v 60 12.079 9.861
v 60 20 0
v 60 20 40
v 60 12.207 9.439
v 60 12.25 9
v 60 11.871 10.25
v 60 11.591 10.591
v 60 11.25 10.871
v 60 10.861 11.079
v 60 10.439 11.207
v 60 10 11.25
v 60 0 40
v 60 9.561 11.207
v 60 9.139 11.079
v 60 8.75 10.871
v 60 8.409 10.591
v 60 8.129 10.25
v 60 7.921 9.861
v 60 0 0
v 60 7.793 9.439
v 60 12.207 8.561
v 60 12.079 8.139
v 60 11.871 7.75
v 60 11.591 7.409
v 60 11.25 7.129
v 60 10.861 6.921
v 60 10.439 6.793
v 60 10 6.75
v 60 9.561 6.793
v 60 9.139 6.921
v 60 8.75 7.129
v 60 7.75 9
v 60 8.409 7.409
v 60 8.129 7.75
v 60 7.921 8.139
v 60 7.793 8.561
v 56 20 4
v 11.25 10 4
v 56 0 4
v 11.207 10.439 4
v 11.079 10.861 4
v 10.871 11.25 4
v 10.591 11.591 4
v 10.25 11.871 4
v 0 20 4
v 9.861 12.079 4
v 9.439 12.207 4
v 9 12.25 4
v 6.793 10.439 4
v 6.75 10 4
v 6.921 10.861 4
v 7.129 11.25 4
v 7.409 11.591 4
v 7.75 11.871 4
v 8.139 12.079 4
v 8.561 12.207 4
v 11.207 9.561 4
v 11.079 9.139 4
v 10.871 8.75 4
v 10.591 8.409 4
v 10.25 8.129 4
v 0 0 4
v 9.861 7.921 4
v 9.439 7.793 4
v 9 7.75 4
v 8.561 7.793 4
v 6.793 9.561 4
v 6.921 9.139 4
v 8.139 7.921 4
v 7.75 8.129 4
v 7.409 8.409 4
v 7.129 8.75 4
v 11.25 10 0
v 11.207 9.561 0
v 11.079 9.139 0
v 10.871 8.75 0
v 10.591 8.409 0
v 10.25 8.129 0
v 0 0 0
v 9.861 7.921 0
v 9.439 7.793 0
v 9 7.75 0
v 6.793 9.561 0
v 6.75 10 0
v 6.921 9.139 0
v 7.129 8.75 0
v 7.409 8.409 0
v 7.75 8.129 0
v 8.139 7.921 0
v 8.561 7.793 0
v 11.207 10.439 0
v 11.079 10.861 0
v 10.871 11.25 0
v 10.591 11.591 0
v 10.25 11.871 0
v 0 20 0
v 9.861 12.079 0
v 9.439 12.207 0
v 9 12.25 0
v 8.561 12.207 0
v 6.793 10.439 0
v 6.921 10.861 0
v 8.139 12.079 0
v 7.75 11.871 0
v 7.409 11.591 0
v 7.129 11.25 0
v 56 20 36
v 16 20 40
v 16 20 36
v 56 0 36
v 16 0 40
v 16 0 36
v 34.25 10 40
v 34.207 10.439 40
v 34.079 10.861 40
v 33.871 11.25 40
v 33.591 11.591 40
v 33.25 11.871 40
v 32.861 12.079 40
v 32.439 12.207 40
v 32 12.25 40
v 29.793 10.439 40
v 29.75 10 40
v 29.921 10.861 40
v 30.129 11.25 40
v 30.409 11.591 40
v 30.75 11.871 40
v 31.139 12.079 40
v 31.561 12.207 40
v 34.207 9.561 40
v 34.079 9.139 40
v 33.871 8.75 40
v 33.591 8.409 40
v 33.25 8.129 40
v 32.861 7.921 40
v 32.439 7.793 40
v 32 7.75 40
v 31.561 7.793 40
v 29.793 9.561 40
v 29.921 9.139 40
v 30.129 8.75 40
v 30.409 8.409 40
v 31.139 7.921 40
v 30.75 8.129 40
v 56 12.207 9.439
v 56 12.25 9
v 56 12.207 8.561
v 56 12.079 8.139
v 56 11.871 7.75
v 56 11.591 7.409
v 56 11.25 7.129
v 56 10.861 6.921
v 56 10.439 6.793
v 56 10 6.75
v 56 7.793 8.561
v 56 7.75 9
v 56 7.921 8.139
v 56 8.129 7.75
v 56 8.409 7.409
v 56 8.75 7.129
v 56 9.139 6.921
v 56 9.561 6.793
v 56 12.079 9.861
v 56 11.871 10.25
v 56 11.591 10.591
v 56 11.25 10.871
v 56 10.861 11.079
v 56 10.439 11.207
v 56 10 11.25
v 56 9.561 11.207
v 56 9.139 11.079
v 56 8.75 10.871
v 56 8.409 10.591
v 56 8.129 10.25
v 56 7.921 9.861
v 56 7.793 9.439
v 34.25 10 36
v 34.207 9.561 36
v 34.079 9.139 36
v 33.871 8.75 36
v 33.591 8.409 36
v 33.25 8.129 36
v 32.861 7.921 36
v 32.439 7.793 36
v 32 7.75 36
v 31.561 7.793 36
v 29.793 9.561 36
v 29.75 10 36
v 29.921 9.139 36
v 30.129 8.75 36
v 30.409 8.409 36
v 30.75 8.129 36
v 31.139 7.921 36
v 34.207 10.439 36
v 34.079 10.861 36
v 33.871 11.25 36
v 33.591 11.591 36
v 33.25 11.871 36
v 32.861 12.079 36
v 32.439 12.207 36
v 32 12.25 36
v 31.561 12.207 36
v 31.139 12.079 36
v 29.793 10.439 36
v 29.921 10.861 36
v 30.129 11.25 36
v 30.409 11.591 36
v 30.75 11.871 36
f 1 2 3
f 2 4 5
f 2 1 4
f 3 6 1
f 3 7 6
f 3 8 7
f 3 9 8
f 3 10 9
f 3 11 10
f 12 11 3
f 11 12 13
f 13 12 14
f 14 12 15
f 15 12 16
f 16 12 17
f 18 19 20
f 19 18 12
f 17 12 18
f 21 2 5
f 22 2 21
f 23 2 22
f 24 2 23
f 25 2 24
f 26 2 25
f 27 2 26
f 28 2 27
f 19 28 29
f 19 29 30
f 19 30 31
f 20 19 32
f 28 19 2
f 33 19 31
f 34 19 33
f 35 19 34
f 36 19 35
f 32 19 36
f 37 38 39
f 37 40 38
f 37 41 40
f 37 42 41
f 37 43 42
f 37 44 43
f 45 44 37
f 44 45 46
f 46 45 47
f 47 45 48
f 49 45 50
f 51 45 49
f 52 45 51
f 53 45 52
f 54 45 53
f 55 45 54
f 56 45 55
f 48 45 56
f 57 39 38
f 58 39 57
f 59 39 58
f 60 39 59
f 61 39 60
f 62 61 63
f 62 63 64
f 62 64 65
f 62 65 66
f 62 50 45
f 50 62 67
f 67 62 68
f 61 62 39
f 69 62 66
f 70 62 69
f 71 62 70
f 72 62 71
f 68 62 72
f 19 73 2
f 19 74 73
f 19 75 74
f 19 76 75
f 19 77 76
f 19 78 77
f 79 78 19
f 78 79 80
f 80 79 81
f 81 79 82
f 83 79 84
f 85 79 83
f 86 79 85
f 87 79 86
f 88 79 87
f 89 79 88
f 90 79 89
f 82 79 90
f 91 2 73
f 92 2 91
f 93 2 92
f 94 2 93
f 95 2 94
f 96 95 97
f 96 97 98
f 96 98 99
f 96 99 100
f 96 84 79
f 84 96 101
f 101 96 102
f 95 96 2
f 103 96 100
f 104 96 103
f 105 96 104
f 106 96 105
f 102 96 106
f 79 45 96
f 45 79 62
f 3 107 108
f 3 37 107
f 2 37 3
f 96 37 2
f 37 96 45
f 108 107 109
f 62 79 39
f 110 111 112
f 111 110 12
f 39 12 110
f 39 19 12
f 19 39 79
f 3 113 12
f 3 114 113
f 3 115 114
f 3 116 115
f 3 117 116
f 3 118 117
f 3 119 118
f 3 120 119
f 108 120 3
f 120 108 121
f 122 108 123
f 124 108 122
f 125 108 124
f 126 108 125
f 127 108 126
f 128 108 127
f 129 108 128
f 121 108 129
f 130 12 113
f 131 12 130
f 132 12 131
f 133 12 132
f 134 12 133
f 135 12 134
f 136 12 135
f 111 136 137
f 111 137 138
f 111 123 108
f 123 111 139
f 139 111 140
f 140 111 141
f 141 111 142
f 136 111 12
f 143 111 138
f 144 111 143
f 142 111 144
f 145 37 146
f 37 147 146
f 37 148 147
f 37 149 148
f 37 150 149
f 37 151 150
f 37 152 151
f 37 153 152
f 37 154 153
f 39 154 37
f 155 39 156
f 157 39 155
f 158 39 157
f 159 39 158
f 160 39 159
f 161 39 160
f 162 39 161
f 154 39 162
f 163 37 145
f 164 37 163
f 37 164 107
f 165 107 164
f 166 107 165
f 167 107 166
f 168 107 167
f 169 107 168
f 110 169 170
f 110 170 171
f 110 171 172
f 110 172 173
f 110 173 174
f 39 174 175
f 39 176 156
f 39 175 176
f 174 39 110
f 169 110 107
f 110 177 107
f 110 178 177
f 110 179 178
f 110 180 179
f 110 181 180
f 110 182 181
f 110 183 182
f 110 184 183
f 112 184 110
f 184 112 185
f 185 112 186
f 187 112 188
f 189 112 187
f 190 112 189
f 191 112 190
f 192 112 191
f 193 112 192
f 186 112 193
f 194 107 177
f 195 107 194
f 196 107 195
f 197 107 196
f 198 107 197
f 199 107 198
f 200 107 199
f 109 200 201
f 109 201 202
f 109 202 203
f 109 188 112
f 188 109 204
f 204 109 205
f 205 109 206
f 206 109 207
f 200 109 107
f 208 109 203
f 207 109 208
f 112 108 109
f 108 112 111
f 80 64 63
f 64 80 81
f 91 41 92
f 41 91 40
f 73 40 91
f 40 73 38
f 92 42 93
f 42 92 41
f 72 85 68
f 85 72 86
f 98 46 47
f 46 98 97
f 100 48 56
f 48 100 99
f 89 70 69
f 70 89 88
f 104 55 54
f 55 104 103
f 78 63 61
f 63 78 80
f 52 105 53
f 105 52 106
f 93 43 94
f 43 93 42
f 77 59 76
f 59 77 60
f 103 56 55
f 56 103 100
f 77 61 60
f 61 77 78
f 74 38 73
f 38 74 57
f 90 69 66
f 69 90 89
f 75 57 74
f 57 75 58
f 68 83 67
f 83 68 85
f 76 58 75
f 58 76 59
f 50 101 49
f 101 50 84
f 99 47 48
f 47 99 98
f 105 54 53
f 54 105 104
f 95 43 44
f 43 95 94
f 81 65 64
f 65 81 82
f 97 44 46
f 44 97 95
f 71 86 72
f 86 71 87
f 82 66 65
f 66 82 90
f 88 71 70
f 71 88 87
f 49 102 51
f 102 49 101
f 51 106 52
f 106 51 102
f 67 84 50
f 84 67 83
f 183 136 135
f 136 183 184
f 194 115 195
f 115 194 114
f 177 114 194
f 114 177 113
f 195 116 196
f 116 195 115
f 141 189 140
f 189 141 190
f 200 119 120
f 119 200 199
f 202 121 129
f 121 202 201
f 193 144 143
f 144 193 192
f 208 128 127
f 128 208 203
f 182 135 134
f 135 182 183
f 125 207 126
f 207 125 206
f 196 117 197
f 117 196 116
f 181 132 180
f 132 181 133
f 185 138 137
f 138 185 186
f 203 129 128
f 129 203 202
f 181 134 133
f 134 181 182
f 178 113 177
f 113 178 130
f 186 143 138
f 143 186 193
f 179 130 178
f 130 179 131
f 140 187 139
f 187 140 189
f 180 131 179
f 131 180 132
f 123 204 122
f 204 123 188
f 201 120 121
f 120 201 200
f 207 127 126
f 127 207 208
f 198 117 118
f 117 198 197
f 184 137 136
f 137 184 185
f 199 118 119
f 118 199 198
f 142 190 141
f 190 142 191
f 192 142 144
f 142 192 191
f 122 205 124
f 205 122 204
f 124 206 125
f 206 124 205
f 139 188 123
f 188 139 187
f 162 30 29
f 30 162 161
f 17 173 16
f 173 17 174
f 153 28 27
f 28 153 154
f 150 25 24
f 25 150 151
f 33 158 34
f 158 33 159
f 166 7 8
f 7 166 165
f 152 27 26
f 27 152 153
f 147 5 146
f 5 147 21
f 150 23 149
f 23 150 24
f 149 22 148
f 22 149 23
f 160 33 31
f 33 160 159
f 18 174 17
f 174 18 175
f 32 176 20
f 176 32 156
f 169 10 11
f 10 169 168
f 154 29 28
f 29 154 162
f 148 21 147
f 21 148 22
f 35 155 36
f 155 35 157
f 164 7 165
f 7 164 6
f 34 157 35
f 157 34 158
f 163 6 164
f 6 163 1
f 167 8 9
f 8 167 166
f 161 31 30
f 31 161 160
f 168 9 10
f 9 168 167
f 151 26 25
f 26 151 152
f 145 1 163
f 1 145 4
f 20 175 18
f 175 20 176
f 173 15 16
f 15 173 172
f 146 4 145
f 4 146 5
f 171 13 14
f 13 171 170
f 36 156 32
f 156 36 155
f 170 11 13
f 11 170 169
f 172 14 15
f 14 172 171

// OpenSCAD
$fn = 32;

// ----------------------------------------------------------------------
// Z-bracket: 60 x 20 x 40 mm
// ----------------------------------------------------------------------

// --- parameters (mm) ---
foot_len = 60;            // lower foot length, X
top_len = 40;             // upper foot length, X
depth = 20;               // bracket width, Y
step_h = 40;              // overall rise, Z
plate_t = 4;              // plate thickness
hole_d = 4.5;             // clearance for M4

module hole_z(px, py, z0) {
  translate([px, py, z0 - 0.5]) cylinder(h = plate_t + 1, d = hole_d);
}
module hole_x(py, pz) {
  translate([-0.5, py, pz]) rotate([0, 90, 0]) cylinder(h = plate_t + 1, d = hole_d);
}

difference() {
  union() {
    cube([foot_len, depth, plate_t]);
    /* web, overlapping the lower foot */
    translate([foot_len - plate_t, 0, 0]) cube([plate_t, depth, step_h]);
    /* upper foot, sunk into the web */
    translate([foot_len - plate_t - top_len, 0, step_h - plate_t]) cube([top_len + plate_t, depth, plate_t]);
  }
  hole_z(9, 10, 0);
  translate([foot_len - plate_t - 24, 0, 0]) hole_z(0, 10, step_h - plate_t);
  translate([foot_len - plate_t, 0, 0]) hole_x(10, 9);
}
